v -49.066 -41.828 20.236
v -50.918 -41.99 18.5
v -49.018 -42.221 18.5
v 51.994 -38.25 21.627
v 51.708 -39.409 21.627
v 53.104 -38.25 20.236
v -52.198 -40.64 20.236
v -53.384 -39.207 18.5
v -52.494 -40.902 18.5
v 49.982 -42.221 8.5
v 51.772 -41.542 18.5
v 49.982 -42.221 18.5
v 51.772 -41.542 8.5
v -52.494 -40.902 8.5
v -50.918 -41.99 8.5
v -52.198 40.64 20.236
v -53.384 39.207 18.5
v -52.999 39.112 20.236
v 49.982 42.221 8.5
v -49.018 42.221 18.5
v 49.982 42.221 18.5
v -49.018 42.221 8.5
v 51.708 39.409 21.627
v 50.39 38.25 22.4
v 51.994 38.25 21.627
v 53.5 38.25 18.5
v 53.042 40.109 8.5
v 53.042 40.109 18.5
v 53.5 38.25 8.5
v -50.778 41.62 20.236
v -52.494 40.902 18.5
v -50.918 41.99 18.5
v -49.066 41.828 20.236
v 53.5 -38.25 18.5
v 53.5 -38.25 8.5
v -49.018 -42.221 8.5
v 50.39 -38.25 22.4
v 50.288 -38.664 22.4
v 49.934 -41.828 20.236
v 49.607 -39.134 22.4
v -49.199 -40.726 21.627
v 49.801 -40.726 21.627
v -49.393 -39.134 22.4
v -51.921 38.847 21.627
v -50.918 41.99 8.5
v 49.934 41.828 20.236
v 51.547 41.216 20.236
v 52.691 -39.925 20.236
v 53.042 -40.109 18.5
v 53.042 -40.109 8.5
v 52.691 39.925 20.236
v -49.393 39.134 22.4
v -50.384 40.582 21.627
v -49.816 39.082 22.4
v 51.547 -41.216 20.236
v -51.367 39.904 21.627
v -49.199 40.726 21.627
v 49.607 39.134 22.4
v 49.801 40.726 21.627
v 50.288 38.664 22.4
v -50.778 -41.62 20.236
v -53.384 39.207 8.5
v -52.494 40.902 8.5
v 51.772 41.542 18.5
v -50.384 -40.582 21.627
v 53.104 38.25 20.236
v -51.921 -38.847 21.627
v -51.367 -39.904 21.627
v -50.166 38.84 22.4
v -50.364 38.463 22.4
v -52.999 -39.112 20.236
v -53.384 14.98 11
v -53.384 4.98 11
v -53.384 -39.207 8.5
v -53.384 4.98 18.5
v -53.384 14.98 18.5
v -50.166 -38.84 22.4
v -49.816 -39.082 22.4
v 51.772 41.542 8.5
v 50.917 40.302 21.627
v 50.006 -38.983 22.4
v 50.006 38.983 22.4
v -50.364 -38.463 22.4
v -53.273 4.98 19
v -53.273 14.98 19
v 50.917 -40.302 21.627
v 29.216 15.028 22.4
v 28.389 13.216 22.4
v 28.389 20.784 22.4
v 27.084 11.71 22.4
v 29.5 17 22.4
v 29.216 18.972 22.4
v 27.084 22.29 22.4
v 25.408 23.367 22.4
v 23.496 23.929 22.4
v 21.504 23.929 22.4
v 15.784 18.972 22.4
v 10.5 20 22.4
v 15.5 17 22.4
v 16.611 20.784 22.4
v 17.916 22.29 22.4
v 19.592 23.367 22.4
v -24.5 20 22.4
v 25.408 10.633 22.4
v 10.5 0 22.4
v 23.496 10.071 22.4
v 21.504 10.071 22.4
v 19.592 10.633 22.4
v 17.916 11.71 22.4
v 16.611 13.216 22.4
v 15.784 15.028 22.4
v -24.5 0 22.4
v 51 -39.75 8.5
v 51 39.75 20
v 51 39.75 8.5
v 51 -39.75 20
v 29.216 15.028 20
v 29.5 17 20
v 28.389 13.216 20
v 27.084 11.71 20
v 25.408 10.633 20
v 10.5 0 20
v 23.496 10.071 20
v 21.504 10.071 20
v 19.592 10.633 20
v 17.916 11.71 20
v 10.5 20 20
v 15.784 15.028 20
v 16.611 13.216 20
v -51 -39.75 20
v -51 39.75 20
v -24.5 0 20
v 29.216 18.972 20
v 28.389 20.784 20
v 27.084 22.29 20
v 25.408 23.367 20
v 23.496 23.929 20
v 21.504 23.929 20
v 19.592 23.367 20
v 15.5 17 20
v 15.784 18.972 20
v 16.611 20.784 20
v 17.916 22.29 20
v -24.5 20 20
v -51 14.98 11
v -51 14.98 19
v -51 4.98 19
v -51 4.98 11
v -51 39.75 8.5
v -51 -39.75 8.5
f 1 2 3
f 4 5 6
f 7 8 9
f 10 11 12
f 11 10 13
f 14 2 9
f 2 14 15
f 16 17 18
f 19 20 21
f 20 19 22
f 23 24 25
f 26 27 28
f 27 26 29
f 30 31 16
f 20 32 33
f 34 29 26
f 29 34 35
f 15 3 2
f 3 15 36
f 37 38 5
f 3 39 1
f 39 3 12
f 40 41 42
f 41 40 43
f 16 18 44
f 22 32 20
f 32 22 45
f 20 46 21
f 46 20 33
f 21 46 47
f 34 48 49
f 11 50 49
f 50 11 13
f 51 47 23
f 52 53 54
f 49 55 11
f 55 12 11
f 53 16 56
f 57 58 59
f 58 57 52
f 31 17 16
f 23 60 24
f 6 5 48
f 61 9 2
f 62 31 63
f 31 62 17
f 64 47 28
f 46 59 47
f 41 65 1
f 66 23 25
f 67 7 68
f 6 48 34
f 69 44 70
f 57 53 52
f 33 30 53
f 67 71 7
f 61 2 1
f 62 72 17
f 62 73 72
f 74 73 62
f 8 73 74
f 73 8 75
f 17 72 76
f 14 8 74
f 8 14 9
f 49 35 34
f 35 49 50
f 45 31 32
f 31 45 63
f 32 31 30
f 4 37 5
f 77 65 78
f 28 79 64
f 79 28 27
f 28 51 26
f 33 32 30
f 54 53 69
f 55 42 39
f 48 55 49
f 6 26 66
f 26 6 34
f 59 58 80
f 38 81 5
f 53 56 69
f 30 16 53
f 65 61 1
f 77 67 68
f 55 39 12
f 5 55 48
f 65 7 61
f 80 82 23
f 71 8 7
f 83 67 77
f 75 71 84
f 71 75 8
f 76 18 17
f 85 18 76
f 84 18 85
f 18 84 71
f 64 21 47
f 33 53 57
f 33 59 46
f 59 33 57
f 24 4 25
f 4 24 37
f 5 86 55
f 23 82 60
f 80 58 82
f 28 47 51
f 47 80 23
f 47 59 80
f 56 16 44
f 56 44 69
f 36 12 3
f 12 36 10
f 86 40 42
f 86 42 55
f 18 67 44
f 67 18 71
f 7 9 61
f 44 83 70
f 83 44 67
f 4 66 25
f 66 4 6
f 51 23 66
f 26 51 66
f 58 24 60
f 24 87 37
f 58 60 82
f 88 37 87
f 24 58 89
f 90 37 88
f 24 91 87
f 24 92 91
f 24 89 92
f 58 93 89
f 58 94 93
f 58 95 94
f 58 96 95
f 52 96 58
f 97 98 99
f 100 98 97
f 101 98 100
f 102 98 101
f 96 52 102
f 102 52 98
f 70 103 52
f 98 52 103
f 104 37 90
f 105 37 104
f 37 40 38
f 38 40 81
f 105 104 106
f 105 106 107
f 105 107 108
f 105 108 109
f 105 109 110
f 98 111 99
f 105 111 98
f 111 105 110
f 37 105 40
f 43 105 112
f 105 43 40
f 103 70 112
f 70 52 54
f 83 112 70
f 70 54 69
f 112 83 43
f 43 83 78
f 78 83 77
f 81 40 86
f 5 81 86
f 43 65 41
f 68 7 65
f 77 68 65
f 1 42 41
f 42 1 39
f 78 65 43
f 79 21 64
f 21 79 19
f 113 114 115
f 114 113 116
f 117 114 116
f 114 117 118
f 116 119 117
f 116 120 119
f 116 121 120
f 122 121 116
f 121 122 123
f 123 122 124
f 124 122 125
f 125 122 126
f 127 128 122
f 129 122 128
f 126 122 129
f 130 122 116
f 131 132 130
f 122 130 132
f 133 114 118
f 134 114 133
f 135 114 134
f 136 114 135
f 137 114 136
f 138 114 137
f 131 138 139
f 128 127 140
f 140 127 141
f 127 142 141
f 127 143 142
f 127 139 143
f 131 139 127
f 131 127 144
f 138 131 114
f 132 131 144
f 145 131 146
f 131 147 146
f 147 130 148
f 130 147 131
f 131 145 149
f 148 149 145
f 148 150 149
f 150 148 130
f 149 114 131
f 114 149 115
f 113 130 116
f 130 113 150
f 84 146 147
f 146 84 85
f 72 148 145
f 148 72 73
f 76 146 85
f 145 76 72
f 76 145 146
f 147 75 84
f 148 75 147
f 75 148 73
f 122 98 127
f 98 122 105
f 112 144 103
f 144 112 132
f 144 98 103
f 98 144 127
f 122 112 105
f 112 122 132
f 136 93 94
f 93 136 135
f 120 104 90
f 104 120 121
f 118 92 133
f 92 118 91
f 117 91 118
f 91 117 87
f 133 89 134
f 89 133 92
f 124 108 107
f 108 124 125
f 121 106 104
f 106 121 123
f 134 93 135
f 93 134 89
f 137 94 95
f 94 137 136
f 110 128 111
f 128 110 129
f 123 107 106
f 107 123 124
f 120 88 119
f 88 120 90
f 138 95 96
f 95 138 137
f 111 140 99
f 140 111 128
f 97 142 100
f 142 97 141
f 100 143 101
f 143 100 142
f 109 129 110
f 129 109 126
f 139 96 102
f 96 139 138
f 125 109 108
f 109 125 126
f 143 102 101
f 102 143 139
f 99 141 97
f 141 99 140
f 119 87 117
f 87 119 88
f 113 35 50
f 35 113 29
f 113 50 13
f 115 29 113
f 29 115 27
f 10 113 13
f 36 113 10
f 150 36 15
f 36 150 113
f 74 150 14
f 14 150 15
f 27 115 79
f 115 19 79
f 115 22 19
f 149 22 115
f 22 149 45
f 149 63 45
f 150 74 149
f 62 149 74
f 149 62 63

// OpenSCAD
/* This module constructs the main body of the enclosure. First, we name the module: */

//pcb dimensions (mm)
pcb_l = 92; // (x dim, edges of PCB)
pcb_w = 69.5; // (y dim, edges of PCB)
pcb_h = 30; // (z dim, from bottom of PCB to top with placed components / headers / etc)r

buffer = 10; // buffer zone around edges of pcb
wall_thickness = 2;

// inner cavity size overall
cavity_l = pcb_l+buffer; // x dim
cavity_w = pcb_w+buffer; // y dim
cavity_h = pcb_h+buffer; // z dim

// outer dimensions
minkowski_radius = cavity_h/10;
outer_l = cavity_l + wall_thickness/2;
outer_w = cavity_w + wall_thickness/2;
outer_h = cavity_h + wall_thickness/2;


//top cover height
cover_height = 10 + wall_thickness; 

// button 1
button1_radius = 3.5; //mm
button1_y = -12.09;
button1_z = 5;

// button 2
button2_radius = button1_radius;
button2_y = -22.53;
button2_z = button1_z;

// mic
mic_radius = 7;
mic_x = 22.5;
mic_y = 17;

// usb opening
usb_y = 9.98;
usb_dy = 10;
usb_z = 15;
usb_dz = 8;

//screen
screen_x = -7; //x position of center of screen
screen_y = 10; //y position of center of screen
screen_dx = 35; //length of screen (x dim)
screen_dy = 20; //

module enclosure() {

difference() {

minkowski()
{

difference()
{
translate([0,0,0])
//make the box larger than the cavity by wall thickness, correcting for minkowski radius  
cube([outer_l - minkowski_radius,
      outer_w - minkowski_radius,
      outer_h - minkowski_radius], 
      center=true);
};

sphere(minkowski_radius);
};

cube([cavity_l,cavity_w,cavity_h], center=true);
}
}

module enclosureHoles() {

union() {

// USB
translate([-cavity_l/2-10,usb_y-usb_dy/2,usb_z-usb_dz/2])
cube([10*wall_thickness, usb_dy, usb_dz]);
    
// button #1
translate([-cavity_l/2,button1_y,button1_z])
rotate([0,-90,0])
cylinder(r=button1_radius, h=10*wall_thickness);

// button #2
translate([-cavity_l/2,button2_y,button2_z])
rotate([0,-90,0])
cylinder(r=button2_radius, h=10*wall_thickness);
    
// Screen
translate([screen_x-screen_dx/2,screen_y-screen_dy/2,cavity_h/2])
cube([screen_dx, screen_dy,10*wall_thickness]);

// mic
translate([mic_x,mic_y,cavity_h/2-10*wall_thickness/2])
cylinder(r=mic_radius, h=20*wall_thickness);

}
}

module concat() {

difference() {
enclosure();
enclosureHoles();
}
}


// RENDER FULL
//concat();

/* To actually print, we’ll need to render it in two separate halves which we will attach later. So, comment out the above concat() command and instead run the below code to render the top only */


// RENDER COVER (by subtracting bottom)
difference() {
concat();
translate([0,0,-cover_height])
cube([outer_l*1.5,outer_w*1.5,outer_h], center=true);
}



//// RENDER BOTTOM (by subtracting top)
//difference() {
//concat();
//translate([0,0,outer_h-cover_width])
//cube([outer_l*1.5,outer_w*1.5,outer_h], center=true);
//}
